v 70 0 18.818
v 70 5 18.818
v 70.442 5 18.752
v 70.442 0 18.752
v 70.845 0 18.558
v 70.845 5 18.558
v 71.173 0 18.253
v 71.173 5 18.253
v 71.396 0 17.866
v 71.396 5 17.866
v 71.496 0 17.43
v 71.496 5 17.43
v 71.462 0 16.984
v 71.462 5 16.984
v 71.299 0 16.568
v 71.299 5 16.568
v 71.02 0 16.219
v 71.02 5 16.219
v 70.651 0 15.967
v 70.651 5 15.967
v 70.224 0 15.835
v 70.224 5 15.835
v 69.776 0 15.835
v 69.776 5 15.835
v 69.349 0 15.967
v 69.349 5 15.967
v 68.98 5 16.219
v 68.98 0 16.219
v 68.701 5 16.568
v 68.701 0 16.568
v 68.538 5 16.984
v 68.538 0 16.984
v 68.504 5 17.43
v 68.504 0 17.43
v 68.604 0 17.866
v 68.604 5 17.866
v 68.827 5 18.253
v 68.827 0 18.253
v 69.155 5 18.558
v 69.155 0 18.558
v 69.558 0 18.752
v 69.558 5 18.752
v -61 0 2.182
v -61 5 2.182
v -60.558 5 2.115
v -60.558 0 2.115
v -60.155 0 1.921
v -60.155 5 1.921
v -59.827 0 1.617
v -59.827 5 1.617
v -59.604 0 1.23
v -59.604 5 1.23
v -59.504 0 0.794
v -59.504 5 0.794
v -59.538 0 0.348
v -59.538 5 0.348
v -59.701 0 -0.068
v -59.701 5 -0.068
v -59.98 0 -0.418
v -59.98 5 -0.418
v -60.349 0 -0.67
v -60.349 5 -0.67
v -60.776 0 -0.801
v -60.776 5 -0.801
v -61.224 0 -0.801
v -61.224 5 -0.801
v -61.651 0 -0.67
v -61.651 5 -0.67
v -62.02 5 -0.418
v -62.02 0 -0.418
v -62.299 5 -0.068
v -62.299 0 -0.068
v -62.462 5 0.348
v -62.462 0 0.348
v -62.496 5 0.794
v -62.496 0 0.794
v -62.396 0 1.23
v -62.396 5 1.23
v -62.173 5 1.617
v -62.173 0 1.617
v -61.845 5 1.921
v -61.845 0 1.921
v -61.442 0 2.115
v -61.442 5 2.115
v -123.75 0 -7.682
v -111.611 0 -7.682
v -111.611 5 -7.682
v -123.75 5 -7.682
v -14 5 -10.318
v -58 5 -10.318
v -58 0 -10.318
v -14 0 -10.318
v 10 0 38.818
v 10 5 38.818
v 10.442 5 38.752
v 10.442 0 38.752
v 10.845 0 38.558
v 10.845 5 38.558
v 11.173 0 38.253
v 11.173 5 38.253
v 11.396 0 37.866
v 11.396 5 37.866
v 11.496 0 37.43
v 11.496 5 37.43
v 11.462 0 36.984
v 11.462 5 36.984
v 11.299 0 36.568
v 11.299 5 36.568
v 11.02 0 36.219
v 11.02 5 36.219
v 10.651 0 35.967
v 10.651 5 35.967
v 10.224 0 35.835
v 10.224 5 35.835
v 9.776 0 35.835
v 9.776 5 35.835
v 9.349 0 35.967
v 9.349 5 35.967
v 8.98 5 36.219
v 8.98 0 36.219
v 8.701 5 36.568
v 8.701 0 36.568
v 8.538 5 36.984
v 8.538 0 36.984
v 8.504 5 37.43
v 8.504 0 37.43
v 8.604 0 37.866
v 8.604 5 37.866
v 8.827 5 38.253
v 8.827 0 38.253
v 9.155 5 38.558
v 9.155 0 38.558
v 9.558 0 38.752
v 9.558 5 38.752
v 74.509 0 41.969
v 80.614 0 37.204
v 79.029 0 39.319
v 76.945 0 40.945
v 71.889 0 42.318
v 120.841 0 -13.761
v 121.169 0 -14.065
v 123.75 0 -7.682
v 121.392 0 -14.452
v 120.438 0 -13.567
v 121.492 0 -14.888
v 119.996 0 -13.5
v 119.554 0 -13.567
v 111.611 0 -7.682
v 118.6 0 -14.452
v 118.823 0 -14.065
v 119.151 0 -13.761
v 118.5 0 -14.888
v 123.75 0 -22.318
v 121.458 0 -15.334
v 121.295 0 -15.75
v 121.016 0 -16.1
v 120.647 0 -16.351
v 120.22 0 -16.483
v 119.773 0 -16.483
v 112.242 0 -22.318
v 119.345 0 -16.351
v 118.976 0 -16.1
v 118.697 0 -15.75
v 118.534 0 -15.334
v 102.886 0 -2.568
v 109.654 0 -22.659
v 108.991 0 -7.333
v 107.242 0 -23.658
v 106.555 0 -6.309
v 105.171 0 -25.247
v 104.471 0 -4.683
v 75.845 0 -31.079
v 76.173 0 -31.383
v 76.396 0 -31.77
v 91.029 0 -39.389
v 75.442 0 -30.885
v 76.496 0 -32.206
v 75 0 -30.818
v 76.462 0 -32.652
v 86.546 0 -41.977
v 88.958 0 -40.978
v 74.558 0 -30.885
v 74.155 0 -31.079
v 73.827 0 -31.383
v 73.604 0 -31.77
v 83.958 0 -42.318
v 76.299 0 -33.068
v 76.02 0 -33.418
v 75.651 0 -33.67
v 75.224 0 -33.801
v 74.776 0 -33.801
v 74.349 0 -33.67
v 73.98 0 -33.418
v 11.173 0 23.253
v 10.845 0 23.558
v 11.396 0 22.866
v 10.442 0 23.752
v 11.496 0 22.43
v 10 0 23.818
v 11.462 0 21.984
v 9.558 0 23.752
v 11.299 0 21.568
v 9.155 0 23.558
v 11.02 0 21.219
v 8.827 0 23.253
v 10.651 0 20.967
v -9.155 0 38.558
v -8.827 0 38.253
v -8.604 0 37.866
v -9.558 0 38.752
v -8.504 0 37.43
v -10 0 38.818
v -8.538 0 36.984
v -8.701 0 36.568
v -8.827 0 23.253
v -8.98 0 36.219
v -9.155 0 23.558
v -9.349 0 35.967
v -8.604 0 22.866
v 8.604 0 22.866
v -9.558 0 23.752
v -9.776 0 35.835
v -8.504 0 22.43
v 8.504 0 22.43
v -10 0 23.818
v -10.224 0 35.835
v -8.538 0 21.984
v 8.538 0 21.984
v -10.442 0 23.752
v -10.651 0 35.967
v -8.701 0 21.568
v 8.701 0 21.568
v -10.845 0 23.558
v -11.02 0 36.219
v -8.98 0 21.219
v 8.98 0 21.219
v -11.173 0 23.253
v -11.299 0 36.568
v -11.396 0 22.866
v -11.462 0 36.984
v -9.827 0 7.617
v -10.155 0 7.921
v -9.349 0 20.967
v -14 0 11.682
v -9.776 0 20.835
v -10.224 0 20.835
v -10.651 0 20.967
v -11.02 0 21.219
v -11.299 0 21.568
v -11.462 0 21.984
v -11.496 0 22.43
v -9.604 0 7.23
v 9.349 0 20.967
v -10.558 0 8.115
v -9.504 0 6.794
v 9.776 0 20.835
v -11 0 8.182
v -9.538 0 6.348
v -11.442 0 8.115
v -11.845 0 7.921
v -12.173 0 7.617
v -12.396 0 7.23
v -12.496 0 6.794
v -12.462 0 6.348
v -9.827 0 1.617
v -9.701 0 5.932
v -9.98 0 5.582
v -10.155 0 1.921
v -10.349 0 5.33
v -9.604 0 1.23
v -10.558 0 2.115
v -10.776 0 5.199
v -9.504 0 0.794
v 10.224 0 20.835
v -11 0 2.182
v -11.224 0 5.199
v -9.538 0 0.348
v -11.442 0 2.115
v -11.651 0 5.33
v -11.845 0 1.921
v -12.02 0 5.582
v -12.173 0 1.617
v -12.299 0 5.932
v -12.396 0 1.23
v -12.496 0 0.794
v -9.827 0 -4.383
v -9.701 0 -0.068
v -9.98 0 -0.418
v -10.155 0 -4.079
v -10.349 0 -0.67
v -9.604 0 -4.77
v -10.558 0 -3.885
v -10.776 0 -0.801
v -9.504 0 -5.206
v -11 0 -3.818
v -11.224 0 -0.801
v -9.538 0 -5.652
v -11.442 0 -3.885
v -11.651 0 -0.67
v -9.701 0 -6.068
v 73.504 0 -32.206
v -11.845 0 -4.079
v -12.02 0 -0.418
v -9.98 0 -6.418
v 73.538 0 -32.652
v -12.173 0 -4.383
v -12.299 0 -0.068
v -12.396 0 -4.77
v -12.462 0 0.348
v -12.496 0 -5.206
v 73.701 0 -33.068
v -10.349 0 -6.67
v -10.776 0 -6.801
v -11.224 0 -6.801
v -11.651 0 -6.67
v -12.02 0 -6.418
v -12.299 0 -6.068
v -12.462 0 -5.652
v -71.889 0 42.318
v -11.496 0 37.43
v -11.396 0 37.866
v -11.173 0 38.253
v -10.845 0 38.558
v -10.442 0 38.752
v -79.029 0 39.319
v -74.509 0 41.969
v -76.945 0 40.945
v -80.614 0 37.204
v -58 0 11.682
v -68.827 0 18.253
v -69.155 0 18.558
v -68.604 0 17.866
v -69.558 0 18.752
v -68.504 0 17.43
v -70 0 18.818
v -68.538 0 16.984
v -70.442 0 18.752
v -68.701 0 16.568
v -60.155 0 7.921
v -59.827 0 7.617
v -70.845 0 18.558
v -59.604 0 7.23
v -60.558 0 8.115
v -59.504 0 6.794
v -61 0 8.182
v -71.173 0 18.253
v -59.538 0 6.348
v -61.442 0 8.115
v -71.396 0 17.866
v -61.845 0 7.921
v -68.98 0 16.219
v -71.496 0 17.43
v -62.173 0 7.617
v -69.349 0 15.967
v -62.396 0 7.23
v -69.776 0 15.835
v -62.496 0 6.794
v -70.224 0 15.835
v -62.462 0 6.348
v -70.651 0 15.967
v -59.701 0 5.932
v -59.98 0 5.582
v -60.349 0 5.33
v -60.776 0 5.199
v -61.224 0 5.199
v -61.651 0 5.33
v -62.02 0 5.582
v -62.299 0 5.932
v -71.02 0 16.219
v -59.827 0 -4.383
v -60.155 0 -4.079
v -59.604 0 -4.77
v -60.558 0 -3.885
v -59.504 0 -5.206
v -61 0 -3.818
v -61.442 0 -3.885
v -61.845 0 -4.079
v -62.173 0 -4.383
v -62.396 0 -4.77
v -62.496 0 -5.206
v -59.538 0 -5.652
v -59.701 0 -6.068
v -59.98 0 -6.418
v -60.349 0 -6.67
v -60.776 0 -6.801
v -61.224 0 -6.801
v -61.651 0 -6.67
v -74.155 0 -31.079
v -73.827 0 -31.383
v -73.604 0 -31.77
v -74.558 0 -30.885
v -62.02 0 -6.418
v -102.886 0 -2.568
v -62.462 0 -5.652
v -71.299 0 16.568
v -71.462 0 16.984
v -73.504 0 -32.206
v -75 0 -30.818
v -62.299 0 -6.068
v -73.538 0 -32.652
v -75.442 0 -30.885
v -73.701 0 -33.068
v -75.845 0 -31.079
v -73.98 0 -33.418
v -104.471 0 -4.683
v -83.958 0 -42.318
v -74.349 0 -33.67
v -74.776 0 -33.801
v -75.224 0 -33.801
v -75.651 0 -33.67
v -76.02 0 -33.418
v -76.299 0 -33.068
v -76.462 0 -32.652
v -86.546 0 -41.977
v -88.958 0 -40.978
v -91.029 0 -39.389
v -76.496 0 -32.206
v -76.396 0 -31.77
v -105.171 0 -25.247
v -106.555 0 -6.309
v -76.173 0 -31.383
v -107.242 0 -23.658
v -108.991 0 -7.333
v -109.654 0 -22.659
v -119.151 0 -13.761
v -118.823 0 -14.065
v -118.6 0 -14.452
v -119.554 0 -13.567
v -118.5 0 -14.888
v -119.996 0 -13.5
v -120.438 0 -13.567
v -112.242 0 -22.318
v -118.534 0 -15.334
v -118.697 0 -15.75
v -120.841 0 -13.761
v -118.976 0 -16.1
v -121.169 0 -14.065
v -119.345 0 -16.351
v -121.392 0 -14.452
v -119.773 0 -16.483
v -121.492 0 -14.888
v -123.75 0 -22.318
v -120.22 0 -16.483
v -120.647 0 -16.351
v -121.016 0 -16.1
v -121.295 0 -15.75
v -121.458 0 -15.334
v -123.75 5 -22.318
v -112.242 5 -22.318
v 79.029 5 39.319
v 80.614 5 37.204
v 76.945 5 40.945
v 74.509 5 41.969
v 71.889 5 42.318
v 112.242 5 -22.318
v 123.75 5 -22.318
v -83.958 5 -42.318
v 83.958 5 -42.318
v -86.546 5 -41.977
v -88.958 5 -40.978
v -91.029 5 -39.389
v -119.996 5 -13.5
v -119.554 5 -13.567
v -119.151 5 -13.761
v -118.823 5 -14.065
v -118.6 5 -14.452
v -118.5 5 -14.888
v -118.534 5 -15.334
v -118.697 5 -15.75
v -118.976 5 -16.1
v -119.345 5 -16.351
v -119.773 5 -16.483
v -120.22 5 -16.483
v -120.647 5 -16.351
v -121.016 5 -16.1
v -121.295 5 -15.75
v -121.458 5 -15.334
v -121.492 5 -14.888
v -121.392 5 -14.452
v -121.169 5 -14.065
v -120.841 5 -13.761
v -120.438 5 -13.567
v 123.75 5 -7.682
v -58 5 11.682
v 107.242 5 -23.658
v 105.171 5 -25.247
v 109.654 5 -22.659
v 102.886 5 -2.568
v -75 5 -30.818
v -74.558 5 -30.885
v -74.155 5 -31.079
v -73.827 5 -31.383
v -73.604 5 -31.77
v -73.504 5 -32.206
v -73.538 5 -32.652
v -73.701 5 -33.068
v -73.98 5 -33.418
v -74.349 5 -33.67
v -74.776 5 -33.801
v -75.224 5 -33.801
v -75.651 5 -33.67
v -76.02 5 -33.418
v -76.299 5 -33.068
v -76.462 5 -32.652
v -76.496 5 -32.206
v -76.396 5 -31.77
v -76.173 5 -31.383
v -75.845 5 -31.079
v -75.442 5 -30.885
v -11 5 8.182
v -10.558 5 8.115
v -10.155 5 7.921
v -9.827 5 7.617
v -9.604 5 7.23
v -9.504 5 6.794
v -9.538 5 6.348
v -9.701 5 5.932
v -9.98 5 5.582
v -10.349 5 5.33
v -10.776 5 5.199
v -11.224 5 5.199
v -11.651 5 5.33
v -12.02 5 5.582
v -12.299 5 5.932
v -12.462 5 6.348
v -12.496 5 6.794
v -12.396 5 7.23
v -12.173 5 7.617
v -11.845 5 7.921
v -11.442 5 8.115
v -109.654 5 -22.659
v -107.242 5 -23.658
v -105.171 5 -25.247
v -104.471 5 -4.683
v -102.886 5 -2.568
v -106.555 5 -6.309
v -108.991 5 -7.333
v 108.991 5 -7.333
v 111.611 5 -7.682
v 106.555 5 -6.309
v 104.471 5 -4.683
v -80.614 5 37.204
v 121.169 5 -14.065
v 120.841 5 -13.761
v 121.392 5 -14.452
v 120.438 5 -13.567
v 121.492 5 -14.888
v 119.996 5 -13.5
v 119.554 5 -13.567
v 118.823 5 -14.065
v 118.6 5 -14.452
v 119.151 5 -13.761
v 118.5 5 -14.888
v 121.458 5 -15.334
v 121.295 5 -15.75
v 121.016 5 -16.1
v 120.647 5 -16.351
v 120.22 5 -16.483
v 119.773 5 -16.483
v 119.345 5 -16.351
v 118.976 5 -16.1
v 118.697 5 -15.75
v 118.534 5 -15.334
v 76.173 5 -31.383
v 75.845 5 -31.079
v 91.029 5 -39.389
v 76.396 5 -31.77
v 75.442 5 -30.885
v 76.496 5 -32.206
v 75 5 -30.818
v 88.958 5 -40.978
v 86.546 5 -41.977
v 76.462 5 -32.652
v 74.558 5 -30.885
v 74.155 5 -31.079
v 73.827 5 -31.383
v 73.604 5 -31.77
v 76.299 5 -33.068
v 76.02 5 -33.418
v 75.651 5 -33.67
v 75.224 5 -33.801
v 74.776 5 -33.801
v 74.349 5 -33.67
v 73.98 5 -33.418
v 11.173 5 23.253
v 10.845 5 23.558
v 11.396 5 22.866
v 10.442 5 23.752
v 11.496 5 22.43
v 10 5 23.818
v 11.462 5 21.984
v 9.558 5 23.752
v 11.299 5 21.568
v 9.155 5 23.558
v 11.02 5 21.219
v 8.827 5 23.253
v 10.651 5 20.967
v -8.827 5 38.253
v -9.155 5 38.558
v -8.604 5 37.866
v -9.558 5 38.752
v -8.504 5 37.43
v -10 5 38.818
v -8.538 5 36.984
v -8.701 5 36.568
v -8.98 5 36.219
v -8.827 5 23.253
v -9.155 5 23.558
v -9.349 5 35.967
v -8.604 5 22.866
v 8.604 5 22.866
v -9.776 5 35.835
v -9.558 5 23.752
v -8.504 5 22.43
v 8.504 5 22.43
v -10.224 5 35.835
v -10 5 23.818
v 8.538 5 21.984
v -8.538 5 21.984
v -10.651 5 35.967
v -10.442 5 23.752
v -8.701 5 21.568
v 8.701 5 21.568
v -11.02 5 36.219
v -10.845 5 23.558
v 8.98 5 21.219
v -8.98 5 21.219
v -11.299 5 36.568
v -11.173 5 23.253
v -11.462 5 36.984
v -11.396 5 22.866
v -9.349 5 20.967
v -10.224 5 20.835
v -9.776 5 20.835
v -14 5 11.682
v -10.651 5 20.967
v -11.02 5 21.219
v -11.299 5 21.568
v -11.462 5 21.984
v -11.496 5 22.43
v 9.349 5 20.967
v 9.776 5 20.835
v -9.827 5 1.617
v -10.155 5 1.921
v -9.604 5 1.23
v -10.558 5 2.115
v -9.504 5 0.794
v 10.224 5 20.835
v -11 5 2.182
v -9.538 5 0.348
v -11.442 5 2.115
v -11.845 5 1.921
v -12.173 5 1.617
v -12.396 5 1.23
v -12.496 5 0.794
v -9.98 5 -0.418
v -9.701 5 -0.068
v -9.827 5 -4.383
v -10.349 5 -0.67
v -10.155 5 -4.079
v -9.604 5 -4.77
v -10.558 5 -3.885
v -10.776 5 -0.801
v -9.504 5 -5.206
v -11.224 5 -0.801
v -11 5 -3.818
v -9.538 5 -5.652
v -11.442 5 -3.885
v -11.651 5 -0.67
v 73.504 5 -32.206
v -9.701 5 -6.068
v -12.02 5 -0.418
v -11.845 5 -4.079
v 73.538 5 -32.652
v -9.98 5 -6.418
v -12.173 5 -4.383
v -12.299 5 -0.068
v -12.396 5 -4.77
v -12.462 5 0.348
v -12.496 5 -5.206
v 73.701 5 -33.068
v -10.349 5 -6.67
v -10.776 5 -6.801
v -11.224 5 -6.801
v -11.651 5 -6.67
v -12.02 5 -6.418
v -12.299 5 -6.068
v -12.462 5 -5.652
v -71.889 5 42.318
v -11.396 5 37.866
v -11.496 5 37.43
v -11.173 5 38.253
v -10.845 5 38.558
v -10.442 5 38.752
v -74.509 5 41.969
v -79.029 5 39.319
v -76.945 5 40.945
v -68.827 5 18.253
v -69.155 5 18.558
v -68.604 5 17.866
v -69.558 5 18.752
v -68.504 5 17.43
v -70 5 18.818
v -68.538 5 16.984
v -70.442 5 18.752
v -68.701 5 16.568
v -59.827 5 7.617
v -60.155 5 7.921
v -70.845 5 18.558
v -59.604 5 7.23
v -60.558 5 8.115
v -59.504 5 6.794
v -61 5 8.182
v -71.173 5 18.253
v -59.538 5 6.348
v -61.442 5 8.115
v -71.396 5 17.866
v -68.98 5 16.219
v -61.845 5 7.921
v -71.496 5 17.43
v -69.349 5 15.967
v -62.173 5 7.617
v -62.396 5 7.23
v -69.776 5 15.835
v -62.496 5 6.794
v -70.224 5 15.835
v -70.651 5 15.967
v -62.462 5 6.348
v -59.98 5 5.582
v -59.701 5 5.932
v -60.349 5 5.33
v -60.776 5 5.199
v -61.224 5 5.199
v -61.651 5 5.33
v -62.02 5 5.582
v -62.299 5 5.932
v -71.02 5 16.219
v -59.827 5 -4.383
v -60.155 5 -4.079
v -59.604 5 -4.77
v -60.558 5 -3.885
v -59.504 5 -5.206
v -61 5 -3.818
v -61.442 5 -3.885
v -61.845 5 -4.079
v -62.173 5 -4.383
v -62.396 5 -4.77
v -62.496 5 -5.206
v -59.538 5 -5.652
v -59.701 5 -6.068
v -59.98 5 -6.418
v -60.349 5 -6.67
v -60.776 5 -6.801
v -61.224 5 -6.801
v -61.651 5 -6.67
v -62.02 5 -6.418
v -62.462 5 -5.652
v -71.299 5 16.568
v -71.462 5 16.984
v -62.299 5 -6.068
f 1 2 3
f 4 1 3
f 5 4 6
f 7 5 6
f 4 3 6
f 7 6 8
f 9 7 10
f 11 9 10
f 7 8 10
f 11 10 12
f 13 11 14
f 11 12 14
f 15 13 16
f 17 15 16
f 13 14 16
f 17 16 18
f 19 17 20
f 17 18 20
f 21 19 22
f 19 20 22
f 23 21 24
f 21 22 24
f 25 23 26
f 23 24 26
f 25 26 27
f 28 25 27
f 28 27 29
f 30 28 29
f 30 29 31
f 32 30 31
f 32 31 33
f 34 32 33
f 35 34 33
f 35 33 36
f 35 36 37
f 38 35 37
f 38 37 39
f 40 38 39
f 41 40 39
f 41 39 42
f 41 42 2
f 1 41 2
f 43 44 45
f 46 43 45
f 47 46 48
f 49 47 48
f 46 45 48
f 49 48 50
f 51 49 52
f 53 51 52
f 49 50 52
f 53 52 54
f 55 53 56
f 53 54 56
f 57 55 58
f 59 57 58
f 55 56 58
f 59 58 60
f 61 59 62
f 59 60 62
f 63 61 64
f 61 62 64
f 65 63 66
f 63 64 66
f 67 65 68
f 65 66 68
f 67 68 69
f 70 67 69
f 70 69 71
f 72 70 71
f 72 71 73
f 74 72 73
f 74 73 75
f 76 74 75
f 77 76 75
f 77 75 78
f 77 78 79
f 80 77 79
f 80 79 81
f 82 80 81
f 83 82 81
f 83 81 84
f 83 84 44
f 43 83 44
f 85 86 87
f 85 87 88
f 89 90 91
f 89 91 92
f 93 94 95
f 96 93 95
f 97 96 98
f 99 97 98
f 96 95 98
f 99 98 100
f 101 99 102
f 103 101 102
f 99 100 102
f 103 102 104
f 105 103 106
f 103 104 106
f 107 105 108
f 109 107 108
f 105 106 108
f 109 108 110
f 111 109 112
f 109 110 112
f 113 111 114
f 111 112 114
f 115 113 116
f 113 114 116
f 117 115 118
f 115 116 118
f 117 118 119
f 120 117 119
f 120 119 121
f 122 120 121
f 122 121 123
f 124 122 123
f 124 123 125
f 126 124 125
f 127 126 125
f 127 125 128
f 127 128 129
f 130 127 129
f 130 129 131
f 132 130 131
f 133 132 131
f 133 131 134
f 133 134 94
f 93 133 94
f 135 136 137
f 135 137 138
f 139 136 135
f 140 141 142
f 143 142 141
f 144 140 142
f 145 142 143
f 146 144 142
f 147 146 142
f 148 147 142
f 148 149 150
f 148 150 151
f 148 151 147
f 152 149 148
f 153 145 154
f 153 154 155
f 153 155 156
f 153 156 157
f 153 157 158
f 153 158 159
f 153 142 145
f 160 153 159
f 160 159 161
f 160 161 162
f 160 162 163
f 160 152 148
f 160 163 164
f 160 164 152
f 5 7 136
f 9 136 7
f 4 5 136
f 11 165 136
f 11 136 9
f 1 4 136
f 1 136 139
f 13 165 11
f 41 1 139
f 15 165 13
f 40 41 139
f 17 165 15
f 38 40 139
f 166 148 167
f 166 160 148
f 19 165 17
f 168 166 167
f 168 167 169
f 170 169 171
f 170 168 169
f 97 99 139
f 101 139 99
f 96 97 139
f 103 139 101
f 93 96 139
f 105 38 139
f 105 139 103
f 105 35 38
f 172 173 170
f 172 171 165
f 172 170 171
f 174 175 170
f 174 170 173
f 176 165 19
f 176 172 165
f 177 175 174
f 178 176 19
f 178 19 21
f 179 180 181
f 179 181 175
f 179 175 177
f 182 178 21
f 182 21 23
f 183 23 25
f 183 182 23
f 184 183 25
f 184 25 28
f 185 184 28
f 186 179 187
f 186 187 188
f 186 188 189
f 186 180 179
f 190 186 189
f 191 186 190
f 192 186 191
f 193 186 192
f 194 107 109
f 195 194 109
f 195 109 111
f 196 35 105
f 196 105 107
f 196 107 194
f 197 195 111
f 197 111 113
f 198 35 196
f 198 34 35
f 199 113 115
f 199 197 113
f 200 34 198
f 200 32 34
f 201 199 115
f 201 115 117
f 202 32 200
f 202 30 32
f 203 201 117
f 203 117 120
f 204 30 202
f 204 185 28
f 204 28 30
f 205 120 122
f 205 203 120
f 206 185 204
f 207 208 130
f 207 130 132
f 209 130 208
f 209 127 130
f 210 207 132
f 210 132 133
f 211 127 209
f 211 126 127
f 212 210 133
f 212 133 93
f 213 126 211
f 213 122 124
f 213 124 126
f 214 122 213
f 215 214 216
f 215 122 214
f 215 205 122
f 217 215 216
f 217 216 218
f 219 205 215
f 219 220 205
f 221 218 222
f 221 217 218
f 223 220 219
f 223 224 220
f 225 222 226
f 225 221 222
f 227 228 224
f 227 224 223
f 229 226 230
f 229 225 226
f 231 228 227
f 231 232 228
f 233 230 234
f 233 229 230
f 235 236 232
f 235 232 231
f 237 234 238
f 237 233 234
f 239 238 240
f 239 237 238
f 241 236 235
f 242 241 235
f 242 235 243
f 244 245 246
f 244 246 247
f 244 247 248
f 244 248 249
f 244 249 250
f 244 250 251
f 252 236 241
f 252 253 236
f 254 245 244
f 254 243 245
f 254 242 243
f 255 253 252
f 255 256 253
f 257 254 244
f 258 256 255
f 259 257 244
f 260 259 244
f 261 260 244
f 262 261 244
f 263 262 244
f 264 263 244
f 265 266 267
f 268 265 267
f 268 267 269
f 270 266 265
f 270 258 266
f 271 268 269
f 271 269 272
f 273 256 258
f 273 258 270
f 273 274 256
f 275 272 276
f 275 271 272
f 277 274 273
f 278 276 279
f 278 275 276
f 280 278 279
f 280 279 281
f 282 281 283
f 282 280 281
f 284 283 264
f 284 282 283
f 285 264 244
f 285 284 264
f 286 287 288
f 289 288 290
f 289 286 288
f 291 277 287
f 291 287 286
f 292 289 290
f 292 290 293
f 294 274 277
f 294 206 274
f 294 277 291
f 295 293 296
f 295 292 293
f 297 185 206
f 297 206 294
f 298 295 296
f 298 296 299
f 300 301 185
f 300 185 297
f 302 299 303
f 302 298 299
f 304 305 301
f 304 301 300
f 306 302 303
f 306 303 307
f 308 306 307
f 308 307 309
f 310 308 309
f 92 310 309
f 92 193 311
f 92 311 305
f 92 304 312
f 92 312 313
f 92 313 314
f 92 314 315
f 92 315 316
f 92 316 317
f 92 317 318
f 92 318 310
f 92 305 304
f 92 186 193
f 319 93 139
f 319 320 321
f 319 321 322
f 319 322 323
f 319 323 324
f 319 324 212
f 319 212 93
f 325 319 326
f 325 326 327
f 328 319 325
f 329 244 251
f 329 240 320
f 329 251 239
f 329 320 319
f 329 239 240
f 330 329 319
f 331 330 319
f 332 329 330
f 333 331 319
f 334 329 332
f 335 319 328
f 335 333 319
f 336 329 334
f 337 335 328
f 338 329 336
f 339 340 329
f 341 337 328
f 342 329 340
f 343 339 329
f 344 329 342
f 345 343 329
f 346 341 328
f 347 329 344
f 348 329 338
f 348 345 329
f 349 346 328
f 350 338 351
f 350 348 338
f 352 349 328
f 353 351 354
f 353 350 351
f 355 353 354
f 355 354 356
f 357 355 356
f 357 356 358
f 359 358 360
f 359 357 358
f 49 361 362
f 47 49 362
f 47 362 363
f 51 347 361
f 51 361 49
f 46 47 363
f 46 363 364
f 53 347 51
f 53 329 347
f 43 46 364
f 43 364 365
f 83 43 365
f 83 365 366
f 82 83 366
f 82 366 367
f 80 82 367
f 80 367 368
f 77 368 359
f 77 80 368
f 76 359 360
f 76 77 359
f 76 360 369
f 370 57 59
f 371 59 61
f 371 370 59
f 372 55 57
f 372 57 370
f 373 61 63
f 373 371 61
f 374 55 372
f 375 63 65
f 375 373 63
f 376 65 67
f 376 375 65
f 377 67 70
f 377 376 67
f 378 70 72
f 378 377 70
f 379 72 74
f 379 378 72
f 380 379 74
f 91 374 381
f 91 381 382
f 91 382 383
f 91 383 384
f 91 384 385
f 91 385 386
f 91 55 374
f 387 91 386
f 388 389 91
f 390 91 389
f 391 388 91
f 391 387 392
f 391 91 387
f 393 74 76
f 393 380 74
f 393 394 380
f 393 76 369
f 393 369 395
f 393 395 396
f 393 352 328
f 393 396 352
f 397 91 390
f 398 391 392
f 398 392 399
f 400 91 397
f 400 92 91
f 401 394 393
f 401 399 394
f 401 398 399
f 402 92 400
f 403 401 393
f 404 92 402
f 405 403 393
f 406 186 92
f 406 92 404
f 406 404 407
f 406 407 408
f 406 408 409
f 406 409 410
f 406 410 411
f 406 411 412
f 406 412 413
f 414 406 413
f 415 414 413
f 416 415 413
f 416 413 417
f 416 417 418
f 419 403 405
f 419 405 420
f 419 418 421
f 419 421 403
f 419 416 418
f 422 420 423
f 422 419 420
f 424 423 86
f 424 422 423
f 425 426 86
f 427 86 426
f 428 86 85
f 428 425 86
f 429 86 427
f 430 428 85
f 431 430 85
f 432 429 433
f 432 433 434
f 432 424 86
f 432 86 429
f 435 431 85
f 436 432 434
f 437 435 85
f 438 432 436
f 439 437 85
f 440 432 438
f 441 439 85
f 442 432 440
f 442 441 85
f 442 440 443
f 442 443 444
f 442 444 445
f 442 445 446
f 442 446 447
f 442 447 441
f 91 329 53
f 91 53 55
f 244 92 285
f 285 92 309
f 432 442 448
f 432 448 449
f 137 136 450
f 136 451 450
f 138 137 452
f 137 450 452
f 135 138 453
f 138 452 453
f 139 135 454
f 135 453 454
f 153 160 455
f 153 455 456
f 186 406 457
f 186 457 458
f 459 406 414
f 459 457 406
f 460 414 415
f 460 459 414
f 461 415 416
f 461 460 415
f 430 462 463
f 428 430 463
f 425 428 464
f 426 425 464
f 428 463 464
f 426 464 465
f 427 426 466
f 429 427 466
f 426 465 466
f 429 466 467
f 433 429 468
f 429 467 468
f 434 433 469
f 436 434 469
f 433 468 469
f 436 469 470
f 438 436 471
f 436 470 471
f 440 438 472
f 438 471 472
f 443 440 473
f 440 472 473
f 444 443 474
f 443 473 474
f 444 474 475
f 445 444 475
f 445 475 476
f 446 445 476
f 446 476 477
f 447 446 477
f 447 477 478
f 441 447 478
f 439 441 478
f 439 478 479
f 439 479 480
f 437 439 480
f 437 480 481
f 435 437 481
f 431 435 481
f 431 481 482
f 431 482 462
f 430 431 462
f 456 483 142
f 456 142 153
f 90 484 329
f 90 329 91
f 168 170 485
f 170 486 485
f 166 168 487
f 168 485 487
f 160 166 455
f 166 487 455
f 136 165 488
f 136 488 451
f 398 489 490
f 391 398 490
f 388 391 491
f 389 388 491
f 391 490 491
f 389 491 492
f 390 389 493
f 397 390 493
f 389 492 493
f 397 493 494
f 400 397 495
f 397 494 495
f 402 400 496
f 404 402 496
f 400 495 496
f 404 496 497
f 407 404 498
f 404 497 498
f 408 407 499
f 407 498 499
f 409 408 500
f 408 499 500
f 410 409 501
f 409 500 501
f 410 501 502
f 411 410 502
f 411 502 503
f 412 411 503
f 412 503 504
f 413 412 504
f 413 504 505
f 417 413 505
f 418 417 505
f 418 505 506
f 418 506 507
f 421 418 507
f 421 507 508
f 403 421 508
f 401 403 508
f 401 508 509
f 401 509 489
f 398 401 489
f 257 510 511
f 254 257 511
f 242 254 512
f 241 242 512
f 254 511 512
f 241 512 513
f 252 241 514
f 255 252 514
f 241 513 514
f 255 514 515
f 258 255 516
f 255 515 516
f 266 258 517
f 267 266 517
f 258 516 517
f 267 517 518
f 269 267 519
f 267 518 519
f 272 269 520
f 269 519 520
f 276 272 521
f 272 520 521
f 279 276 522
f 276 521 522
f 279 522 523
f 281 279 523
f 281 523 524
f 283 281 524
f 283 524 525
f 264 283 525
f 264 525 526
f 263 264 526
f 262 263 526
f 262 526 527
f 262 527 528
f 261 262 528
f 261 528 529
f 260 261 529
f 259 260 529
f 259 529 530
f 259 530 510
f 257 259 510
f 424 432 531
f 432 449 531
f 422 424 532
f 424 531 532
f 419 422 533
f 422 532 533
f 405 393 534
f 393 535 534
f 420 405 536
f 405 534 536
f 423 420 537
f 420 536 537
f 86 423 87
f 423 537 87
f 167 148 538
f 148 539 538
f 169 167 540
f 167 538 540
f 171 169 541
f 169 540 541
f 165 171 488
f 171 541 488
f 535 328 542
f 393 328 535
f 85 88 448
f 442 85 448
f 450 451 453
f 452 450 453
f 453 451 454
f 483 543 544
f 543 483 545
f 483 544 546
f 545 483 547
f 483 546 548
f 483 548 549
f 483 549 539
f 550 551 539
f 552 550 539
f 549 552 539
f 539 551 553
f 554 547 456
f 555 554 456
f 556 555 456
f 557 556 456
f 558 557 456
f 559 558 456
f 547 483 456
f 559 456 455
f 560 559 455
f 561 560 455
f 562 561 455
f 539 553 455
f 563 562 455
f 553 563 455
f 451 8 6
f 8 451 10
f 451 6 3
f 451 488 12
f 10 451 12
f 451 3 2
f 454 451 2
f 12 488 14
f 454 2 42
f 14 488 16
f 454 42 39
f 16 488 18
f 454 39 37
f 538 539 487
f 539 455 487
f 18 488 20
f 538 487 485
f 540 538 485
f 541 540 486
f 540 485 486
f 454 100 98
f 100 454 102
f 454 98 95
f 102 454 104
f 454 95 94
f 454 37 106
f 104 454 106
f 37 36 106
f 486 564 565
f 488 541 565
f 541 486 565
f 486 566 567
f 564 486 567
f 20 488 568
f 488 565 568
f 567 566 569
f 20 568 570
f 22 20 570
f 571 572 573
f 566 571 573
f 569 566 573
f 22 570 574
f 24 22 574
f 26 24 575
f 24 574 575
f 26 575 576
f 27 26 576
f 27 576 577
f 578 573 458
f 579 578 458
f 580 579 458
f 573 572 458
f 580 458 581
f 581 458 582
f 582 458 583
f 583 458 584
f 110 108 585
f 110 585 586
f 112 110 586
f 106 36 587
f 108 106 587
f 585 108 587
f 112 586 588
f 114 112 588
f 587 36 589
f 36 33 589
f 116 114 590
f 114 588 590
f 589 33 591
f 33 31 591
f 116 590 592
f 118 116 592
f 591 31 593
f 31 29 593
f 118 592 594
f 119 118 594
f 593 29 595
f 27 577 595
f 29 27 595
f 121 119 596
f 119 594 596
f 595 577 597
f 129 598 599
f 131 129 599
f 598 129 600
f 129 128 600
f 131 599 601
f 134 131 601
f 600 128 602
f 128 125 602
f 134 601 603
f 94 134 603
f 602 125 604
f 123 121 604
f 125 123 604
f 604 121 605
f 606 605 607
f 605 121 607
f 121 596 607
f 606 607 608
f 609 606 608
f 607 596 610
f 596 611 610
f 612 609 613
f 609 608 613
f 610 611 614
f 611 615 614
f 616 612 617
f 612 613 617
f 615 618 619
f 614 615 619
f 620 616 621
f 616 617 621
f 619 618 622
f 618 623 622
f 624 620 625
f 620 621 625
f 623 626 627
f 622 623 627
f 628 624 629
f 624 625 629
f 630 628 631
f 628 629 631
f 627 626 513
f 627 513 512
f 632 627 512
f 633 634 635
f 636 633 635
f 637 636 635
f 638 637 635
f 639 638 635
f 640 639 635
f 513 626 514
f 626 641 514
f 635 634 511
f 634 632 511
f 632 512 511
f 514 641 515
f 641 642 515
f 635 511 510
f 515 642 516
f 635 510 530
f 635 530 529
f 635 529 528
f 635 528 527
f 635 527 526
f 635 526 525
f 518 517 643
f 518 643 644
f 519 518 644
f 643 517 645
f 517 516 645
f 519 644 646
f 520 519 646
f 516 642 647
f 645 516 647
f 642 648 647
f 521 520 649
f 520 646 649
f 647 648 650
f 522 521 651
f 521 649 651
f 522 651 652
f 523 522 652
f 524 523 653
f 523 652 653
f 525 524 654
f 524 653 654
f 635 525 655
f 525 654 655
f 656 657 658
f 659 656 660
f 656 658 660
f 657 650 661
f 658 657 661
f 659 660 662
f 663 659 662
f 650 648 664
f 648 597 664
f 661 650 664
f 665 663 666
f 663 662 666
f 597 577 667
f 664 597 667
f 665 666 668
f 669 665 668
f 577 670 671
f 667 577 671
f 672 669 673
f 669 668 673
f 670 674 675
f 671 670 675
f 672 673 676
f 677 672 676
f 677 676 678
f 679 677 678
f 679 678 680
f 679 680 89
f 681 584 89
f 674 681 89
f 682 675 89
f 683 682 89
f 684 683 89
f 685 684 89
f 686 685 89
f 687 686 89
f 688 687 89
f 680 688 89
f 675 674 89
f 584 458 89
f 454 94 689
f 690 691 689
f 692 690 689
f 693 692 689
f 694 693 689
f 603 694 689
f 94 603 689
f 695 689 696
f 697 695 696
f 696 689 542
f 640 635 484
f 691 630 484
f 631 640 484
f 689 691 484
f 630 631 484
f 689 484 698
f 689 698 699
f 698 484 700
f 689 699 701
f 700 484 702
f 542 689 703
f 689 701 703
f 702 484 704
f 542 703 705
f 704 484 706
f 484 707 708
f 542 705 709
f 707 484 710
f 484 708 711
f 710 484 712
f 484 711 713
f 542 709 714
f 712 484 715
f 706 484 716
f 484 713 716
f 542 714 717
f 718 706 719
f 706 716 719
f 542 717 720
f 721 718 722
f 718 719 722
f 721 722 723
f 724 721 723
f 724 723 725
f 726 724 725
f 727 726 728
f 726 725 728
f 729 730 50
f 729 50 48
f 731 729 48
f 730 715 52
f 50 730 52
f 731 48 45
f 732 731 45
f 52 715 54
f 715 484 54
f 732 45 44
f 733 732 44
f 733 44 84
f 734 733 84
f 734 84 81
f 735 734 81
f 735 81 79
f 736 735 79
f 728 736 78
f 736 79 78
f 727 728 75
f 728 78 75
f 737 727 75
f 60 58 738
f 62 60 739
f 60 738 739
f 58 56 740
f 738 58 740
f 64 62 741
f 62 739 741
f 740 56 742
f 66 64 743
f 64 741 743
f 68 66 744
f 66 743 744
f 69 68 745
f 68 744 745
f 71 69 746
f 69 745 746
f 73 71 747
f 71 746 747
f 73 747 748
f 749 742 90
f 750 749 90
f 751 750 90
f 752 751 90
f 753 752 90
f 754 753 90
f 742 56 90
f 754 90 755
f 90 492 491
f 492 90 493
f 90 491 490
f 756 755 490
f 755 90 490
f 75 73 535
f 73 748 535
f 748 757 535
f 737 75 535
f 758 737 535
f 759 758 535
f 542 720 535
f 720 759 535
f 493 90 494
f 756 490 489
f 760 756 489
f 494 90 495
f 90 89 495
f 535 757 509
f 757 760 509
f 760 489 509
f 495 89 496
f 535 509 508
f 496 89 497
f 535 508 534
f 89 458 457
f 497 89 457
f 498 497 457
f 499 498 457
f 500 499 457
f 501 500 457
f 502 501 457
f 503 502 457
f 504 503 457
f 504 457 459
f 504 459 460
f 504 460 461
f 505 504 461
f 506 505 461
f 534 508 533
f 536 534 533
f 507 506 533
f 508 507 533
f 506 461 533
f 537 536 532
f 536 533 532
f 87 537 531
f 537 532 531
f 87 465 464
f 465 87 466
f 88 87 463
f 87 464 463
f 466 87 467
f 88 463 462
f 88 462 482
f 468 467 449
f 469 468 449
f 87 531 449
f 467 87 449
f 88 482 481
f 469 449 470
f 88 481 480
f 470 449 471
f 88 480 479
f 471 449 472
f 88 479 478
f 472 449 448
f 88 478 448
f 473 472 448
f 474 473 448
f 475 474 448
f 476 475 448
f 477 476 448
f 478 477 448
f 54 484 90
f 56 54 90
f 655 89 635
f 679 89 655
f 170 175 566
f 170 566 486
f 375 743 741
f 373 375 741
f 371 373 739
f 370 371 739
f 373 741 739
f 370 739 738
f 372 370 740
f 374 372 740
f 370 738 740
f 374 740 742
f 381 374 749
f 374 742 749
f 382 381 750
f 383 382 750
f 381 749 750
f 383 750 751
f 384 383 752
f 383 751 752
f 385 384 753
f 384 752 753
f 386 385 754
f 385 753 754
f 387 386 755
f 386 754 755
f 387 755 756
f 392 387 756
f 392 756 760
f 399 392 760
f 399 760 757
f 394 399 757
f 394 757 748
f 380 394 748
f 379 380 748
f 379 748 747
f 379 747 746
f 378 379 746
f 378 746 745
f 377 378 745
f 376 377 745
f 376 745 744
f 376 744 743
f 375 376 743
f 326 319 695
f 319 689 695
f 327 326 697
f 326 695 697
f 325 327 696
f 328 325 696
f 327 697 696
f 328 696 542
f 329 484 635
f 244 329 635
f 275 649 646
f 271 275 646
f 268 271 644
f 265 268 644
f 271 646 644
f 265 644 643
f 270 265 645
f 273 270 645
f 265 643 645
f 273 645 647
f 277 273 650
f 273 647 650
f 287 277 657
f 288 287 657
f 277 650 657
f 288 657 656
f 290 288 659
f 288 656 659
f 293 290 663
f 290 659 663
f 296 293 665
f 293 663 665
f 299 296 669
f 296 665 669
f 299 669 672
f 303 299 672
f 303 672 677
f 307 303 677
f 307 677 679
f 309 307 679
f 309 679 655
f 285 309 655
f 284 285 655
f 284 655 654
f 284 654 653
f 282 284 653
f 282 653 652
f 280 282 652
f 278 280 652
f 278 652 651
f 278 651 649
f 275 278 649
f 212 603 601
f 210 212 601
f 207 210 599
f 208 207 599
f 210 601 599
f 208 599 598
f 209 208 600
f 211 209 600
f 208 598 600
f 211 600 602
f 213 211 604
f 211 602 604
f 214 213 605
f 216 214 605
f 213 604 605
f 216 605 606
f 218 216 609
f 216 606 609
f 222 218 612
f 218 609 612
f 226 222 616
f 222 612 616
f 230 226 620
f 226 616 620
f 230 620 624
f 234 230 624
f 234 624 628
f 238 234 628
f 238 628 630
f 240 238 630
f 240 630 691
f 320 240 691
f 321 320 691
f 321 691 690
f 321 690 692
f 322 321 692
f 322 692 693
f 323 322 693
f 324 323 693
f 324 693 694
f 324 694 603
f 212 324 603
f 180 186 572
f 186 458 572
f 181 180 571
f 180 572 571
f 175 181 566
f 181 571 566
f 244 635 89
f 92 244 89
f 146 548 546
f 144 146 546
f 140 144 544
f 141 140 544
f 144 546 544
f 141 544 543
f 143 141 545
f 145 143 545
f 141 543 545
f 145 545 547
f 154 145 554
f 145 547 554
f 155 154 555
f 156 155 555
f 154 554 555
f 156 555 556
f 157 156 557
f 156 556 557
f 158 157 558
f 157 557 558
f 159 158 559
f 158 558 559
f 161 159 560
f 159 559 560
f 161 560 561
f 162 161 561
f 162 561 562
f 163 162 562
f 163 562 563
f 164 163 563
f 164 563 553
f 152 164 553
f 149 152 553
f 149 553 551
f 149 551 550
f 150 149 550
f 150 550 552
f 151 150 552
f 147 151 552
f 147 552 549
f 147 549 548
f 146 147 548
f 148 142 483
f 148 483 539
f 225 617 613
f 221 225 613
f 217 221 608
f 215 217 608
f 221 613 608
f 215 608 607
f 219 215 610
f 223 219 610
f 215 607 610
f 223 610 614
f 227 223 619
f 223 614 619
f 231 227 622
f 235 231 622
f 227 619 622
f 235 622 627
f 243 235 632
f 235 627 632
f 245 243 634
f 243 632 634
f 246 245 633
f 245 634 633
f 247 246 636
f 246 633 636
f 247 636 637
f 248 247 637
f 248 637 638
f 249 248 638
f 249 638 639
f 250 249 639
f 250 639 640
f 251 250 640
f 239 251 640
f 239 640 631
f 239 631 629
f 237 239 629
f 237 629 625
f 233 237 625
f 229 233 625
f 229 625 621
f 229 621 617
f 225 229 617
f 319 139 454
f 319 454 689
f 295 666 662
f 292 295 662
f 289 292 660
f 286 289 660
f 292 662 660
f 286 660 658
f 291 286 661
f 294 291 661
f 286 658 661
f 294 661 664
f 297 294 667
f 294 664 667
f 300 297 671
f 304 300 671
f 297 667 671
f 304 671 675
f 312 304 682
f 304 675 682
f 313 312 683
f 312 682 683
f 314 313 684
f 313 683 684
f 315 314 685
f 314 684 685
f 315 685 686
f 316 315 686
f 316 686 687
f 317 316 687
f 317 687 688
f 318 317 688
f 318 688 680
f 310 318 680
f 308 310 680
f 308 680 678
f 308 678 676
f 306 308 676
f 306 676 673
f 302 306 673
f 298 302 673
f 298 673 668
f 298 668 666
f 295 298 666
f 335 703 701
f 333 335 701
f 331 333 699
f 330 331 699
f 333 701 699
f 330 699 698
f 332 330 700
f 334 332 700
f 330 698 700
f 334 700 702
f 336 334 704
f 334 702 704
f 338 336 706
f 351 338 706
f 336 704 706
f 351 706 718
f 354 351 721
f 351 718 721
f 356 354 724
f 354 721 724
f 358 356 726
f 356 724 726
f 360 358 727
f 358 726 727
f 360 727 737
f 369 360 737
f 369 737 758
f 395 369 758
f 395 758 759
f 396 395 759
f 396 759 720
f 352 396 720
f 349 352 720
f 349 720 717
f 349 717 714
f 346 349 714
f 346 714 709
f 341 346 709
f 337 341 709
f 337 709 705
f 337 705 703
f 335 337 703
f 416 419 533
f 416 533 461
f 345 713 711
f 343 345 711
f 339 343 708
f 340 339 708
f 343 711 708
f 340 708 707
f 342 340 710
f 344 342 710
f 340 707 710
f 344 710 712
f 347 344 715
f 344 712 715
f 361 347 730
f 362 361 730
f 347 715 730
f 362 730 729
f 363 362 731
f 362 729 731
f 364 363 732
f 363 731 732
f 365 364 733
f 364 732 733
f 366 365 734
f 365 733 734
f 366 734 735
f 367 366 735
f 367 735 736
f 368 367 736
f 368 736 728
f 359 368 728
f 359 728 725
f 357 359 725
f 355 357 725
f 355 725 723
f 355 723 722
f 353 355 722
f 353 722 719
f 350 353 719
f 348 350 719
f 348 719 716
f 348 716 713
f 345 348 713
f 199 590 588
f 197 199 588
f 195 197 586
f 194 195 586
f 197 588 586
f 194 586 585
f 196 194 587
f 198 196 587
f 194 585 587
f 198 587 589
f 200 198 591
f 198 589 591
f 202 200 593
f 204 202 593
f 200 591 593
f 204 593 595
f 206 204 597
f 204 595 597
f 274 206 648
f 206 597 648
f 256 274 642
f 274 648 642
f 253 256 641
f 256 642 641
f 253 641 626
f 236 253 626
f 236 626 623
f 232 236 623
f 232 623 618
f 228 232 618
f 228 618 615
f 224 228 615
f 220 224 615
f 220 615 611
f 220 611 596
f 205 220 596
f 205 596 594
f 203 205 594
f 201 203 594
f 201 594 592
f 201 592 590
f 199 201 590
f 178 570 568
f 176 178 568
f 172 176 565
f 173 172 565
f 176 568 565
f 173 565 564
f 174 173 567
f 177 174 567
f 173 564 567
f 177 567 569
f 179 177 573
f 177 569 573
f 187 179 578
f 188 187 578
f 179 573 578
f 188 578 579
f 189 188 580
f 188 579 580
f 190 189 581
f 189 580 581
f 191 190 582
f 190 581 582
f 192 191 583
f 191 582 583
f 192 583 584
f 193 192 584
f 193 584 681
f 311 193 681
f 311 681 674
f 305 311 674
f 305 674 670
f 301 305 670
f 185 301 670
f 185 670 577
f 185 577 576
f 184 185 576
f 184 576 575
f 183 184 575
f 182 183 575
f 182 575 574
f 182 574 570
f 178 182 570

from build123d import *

# Parameters (mm, degrees)
SALIENTE_EXTRUIR1_DEPTH = 5
REDONDEO1_R             = 10
CROQUIS2_R              = 1.5
CROQUIS2_W              = 42
CROQUIS2_H              = 20
CORTAR_EXTRUIR1_DEPTH   = 135.669558943
CROQUIS3_W              = 4
CROQUIS3_H              = 14.636342218
CORTAR_EXTRUIR2_DEPTH   = 135.669558943
CROQUIS4_W              = 44
CROQUIS4_H              = 22
CORTAR_EXTRUIR3_DEPTH   = 131.881206084


with BuildPart() as part:
    # Croquis1 → Saliente-Extruir1 (new body)
    with BuildSketch(Plane(origin=(0, 0, 0), x_dir=(1, 0, 0), z_dir=(0, 1, 0))):
        Polygon((-88.1, 42.318171109), (88.1, 42.318171109), (108.1, 22.318171109), (127.75, 22.318171109), (127.75, 7.681828891), (105.75, 7.681828891), (77.75, -42.318171109), (-77.75, -42.318171109), (-105.75, 7.681828891), (-127.75, 7.681828891), (-127.75, 22.318171109), (-108.1, 22.318171109), align=None)
    extrude(amount=SALIENTE_EXTRUIR1_DEPTH)

    # Redondeo1
    redondeo1_edges = [part.edges().sort_by_distance(p)[0] for p in [
        (-88.1, 2.5, -42.318171109),
        (88.1, 2.5, -42.318171109),
        (108.1, 2.5, -22.318171109),
        (105.75, 2.5, -7.681828891),
        (77.75, 2.5, 42.318171109),
        (-77.75, 2.5, 42.318171109),
        (-105.75, 2.5, -7.681828891),
        (-108.1, 2.5, -22.318171109),
    ]]
    fillet(redondeo1_edges, radius=REDONDEO1_R)

    # Croquis2 → Cortar-Extruir1 (cut, through all)
    with BuildSketch(Plane(origin=(0, 5, 0), x_dir=(1, 0, 0), z_dir=(0, 1, 0))):
        with Locations(Location((70, -17.318171109, 0), (0, 0, 270))):
            Circle(CROQUIS2_R)
        with Locations(Location((-70, -17.318171109, 0), (0, 0, 270))):
            Circle(CROQUIS2_R)
        with Locations(Location((-119.996067812, 15, 0), (0, 0, 270))):
            Circle(CROQUIS2_R)
        with Locations(Location((119.996067812, 15, 0), (0, 0, 270))):
            Circle(CROQUIS2_R)
        with Locations(Location((-75, 32.318171109, 0), (0, 0, 270))):
            Circle(CROQUIS2_R)
        with Locations(Location((75, 32.318171109, 0), (0, 0, 270))):
            Circle(CROQUIS2_R)
        with Locations(Location((-10, -22.318171109, 0), (0, 0, 270))):
            Circle(CROQUIS2_R)
        with Locations(Location((10, -22.318171109, 0), (0, 0, 270))):
            Circle(CROQUIS2_R)
        with Locations(Location((-10, -37.318171109, 0), (0, 0, 270))):
            Circle(CROQUIS2_R)
        with Locations(Location((10, -37.318171109, 0), (0, 0, 270))):
            Circle(CROQUIS2_R)
        with Locations(Location((-61, -0.681828891, 0), (0, 0, 270))):
            Circle(CROQUIS2_R)
        with Locations(Location((-11, -0.681828891, 0), (0, 0, 270))):
            Circle(CROQUIS2_R)
        with Locations(Location((-61, 5.318171109, 0), (0, 0, 270))):
            Circle(CROQUIS2_R)
        with Locations(Location((-61, -6.681828891, 0), (0, 0, 270))):
            Circle(CROQUIS2_R)
        with Locations(Location((-11, 5.318171109, 0), (0, 0, 270))):
            Circle(CROQUIS2_R)
        with Locations(Location((-11, -6.681828891, 0), (0, 0, 270))):
            Circle(CROQUIS2_R)
        with Locations((-36, -0.681828891)):
            Rectangle(CROQUIS2_W, CROQUIS2_H)
    extrude(amount=-CORTAR_EXTRUIR1_DEPTH, mode=Mode.SUBTRACT)

    # Croquis3 → Cortar-Extruir2 (cut, through all)
    with BuildSketch(Plane(origin=(0, 5, 0), x_dir=(1, 0, 0), z_dir=(0, 1, 0))):
        with Locations((-125.75, 15)):
            Rectangle(CROQUIS3_W, CROQUIS3_H)
        with Locations((125.75, 15)):
            Rectangle(CROQUIS3_W, CROQUIS3_H)
    extrude(amount=-CORTAR_EXTRUIR2_DEPTH, mode=Mode.SUBTRACT)

    # Croquis4 → Cortar-Extruir3 (cut, through all)
    with BuildSketch(Plane(origin=(0, 5, 0), x_dir=(1, 0, 0), z_dir=(0, 1, 0))):
        with Locations((-36, -0.681828891)):
            Rectangle(CROQUIS4_W, CROQUIS4_H)
    extrude(amount=-CORTAR_EXTRUIR3_DEPTH, mode=Mode.SUBTRACT)


solid = part.part
